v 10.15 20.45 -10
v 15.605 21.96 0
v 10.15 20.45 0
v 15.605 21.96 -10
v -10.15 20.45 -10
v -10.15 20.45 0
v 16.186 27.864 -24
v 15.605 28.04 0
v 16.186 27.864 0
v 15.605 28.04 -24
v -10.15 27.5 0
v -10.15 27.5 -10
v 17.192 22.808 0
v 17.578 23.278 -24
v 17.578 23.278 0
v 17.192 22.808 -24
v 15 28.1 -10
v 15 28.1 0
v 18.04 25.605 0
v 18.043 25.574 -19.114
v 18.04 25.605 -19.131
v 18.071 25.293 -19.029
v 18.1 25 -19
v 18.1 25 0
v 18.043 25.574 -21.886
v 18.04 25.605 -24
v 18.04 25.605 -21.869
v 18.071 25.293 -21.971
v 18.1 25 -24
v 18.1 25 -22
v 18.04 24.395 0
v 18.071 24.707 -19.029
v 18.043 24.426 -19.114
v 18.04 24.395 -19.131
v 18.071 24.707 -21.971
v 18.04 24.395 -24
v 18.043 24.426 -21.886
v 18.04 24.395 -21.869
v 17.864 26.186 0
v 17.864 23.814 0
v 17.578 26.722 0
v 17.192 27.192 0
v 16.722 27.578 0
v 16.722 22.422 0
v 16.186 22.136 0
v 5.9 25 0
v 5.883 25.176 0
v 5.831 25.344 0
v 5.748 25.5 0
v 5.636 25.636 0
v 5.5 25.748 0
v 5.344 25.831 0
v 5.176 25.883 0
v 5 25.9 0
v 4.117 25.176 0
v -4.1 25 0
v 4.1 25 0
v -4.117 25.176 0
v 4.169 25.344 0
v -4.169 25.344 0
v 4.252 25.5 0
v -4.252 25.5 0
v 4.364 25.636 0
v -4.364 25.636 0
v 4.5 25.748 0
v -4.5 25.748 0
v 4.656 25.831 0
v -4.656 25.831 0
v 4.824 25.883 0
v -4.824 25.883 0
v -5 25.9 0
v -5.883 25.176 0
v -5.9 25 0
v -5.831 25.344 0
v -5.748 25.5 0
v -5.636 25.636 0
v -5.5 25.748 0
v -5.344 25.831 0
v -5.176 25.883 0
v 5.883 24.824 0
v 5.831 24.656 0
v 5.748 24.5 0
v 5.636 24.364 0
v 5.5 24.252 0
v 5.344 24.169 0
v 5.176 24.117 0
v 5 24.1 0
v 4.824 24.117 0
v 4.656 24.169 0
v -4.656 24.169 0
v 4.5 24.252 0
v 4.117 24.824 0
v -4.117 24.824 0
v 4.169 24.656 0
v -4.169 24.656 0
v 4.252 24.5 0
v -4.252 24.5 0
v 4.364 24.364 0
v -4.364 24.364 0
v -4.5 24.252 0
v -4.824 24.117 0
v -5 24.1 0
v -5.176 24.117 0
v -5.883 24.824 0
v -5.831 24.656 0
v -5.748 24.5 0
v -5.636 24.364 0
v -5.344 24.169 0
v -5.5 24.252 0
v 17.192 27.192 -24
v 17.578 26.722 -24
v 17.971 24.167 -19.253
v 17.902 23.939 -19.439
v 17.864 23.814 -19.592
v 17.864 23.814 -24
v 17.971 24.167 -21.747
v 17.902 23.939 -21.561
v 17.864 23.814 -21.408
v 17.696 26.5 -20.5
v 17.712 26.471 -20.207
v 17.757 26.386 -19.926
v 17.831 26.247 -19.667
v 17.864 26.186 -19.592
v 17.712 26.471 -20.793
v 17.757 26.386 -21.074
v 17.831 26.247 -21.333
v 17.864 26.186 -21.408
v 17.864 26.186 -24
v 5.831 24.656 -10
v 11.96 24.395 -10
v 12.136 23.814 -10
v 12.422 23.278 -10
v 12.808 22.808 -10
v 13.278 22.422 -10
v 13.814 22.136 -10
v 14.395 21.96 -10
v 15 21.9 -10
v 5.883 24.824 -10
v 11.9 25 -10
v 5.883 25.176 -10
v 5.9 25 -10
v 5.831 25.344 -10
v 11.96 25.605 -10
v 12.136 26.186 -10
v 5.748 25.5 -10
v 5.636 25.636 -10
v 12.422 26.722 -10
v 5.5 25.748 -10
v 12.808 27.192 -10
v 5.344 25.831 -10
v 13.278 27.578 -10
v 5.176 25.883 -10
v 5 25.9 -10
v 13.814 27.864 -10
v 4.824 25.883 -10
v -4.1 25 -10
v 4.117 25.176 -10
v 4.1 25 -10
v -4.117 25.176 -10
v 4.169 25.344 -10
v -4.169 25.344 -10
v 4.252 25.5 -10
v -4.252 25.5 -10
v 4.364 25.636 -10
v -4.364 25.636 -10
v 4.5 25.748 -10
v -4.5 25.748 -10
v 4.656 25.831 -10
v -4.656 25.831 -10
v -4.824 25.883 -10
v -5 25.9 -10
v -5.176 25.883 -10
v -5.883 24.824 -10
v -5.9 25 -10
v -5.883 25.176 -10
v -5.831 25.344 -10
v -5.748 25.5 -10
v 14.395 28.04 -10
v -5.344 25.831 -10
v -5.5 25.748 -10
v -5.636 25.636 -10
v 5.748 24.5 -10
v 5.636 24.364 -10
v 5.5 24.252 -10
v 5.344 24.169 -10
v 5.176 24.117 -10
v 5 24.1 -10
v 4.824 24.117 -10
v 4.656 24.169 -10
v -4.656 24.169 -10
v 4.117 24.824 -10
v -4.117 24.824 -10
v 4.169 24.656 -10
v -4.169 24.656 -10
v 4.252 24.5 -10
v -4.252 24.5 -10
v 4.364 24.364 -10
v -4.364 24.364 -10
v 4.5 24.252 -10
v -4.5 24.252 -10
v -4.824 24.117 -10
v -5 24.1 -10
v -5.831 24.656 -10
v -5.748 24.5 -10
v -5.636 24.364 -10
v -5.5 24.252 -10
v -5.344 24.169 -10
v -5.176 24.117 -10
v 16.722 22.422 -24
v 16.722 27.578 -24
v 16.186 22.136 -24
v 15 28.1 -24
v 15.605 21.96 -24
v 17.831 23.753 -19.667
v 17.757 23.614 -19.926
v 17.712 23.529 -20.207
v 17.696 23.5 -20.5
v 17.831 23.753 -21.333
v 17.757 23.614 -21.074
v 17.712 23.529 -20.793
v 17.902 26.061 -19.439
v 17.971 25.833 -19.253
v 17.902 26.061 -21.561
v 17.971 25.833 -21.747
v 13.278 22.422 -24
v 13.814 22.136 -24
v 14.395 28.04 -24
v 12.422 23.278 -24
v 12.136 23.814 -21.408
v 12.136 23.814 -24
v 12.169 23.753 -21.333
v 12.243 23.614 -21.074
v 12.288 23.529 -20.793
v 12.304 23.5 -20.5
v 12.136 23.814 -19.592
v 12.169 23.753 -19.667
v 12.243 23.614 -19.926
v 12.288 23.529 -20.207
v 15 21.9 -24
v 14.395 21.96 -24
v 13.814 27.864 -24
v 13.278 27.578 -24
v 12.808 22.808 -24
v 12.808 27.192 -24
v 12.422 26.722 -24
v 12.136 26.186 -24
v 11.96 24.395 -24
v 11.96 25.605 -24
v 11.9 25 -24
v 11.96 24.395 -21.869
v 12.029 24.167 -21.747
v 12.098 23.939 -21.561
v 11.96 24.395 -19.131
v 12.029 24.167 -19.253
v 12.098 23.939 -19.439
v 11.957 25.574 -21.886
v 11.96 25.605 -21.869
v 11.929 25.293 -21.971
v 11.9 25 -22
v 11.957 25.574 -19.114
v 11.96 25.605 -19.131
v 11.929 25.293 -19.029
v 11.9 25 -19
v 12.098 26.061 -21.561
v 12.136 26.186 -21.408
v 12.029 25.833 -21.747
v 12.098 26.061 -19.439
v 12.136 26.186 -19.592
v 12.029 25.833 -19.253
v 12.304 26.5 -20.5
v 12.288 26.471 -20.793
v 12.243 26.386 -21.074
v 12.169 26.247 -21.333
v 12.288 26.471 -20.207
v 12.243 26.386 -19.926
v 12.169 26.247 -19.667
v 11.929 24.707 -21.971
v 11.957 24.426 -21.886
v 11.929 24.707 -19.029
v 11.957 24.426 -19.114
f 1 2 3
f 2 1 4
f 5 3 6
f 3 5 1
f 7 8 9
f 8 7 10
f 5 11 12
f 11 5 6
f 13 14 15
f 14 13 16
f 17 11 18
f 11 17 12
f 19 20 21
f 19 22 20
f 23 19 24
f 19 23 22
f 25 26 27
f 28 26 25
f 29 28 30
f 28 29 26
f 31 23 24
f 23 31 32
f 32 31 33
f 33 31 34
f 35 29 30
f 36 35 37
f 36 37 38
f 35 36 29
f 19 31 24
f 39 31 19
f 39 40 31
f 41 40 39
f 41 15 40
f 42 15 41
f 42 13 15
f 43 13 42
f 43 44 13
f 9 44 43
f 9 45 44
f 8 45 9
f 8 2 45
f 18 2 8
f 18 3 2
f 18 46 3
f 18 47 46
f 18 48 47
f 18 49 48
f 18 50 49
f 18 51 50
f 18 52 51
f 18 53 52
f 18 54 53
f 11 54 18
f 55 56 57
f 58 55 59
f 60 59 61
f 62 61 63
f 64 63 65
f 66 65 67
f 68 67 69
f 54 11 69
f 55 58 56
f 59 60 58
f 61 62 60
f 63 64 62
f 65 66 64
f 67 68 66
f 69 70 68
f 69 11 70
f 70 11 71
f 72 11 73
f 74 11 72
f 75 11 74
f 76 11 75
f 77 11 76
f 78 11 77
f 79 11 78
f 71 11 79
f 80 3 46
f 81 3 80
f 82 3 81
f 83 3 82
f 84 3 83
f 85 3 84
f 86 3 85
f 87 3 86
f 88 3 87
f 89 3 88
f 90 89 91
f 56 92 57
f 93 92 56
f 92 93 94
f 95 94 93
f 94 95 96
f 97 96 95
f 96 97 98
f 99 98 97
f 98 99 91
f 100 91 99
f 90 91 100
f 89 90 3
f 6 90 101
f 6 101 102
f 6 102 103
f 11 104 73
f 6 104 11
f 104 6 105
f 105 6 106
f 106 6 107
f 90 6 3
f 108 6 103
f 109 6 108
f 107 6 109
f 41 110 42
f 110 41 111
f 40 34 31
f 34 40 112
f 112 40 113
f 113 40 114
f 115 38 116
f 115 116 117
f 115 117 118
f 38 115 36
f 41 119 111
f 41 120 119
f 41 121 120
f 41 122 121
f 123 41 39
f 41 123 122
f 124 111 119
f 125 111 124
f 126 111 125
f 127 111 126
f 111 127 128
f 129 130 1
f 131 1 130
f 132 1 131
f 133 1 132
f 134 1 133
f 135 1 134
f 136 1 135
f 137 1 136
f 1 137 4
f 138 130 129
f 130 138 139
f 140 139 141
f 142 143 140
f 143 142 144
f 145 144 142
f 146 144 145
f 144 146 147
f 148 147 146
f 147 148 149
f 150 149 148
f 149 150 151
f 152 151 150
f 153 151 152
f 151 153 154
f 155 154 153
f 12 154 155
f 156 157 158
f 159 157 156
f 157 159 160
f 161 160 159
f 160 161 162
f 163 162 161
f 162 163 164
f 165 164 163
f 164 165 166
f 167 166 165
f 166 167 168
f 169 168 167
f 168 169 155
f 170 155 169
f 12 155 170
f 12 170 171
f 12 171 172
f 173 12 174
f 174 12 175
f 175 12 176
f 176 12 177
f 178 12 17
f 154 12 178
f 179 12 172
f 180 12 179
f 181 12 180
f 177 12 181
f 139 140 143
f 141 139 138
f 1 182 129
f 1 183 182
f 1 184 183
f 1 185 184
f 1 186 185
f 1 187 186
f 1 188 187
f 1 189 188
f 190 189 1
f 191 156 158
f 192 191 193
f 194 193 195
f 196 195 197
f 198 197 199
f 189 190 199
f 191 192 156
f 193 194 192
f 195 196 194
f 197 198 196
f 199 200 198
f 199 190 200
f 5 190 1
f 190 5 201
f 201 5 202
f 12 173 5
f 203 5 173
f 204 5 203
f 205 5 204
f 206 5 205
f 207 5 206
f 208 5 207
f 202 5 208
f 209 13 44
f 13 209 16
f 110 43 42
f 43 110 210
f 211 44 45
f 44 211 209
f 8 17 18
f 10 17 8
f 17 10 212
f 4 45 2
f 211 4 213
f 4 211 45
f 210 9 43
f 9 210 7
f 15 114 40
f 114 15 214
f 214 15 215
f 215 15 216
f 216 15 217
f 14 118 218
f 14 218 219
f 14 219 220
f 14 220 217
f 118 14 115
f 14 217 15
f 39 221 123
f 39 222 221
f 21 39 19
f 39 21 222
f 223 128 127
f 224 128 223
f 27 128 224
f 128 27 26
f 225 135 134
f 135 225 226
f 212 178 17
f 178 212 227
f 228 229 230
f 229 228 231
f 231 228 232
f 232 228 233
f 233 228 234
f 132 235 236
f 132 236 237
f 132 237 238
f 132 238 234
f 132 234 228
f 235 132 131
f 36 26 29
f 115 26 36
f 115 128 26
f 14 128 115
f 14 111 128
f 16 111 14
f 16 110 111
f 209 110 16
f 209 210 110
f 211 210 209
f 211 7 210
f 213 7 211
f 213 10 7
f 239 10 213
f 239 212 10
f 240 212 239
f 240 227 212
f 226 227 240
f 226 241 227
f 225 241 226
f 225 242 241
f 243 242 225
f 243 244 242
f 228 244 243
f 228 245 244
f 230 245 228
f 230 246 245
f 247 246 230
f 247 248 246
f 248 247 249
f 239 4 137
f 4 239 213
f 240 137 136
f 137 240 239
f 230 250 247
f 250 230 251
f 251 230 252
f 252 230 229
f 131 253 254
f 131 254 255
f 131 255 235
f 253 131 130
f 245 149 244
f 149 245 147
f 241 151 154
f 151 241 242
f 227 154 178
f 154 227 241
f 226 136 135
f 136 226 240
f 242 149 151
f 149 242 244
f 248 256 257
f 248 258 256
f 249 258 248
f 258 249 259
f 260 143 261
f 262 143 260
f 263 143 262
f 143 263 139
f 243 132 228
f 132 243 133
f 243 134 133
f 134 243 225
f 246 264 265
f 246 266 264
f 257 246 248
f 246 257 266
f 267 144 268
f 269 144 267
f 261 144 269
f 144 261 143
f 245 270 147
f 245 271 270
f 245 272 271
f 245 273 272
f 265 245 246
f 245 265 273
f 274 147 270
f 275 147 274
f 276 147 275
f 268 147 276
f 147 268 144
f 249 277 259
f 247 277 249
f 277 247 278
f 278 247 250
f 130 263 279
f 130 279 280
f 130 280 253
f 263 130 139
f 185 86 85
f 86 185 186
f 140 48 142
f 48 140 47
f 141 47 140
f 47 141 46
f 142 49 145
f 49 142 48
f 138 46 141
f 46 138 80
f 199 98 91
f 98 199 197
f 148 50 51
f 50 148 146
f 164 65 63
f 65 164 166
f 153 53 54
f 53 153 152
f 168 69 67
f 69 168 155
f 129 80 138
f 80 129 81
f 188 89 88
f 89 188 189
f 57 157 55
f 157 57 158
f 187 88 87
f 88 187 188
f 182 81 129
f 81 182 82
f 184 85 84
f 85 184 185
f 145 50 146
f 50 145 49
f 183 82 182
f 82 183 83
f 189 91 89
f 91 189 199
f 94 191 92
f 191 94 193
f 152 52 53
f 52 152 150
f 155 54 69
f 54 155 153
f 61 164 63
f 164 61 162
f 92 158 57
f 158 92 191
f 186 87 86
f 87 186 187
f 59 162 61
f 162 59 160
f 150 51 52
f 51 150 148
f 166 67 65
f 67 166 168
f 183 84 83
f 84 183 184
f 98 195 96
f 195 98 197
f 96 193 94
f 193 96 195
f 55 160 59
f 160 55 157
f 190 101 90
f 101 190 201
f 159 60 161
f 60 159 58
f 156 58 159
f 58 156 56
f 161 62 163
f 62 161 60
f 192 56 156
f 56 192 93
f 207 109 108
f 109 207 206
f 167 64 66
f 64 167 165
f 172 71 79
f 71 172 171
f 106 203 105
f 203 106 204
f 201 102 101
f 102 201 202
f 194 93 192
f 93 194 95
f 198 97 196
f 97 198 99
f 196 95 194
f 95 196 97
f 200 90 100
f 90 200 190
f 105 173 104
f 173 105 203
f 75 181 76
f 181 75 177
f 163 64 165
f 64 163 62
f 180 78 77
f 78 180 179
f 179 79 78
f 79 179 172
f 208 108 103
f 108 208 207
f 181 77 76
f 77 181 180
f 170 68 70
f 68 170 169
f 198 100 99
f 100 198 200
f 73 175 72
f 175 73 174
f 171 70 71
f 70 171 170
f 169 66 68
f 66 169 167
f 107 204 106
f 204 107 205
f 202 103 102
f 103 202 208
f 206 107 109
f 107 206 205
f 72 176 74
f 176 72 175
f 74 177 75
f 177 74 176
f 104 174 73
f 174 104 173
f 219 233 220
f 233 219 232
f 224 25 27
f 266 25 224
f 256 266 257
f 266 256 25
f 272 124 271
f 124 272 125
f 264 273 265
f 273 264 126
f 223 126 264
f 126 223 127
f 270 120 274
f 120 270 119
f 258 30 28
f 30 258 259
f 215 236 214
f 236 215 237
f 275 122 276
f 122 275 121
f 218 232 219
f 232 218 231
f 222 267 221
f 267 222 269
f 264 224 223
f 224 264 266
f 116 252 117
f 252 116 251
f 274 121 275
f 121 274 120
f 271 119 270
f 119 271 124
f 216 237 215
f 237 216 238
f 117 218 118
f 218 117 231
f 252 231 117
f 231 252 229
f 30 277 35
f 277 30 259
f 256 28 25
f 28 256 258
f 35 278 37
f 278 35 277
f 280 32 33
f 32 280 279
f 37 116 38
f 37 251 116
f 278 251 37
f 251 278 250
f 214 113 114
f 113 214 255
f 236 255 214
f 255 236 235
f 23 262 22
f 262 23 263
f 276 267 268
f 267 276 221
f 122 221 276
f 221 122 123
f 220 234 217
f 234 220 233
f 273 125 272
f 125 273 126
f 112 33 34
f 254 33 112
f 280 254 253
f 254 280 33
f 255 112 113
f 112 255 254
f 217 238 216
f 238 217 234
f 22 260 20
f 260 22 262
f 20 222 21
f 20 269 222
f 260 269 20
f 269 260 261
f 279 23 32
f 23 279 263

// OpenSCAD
// file: global_parameters.scad
//this is the distance that precisely sized surfaces must be brought in
//to account for 3d printing error in the XY plane
xy_fudge = 0.4;

//this is the distance that precisely sized surfaces must be brought in
//to account for 3d printing error in the Z direction
z_fudge = 0.1;


//to convert inches to mm
mm_in_1in = 25.4;


epsilon = 0.01;
// file: RaspberryPiCam.scad
/*
   _____                       
 / ___/__ ___ _  ___ _______ _
/ /__/ _ `/  ' \/ -_) __/ _ `/
\___/\_,_/_/_/_/\__/_/ _\_,_/ 
  / __/__  ___  / /__ / /     
 / _// _ \/ _ \/ (_-</_/      
/_/  \___/\___/_/___(_)  */

//Raspberry Pi Camera model

//For use with Pan Tilt Assembly file.

epsilon=.1;
width= 25;
height= 24;
depth=2;
camDispSide= 8.5;
camDispTop=12.5;
camDispBottom=5.5;
camSide=8;
holeD=2;
holeDisp=2;
holeDispHole=21;
holesDisp=9.5;

module cameraBack(){
cube([width,height,depth]);
}

//cameraBack();

module camera(){
translate([camDispSide,camDispBottom,depth])cube([camSide,camSide,depth]);
}
//camera();

module baseCam(){ union(){color("PaleGreen") cameraBack(); color("DarkBlue") camera();}

}

module hole(){
cylinder(h=depth+2*epsilon,r=holeD/2,center=false);
}

module holes(){
translate([holeDisp,holeDisp,-epsilon]) hole();

translate([holeDisp,camDispTop,-epsilon]) hole();

translate([holeDispHole+holeDisp,camDispTop,-epsilon]) hole();

translate([holeDispHole+holeDisp,holeDisp,-epsilon]) hole();
}

//holes();

module rasPiCam(){
difference(){baseCam(); translate([0,holesDisp,0])holes();}
}

//rasPiCam();
// file: servo1.scad
servo_width = 20.3;
servo_height = 38;
servo_length = 40.1;

servo_bracket_height=2.5;
servo_bracket_distance=10;
servo_bracket_length=55;

screw_r = 2.5;
screw_a = 50;
screw_b = 10;

horn_height=8;
horn_thickness=2;
horn_radius=15;
horn_inner_radius=6;
horn_hole_radius=0.8;
horn_hole_separation=4;
horn_hole_position=10;
horn_center_hole_radius = 4;

horn_offset = 9;

//servo();

module servo() {
	color("grey")
	servo_body();

	color("white")
	translate([0,servo_length/2-horn_offset,servo_bracket_distance])
		servo_horn();

}

module servo_body() {
color("DarkGrey")
translate([0,0,-servo_height+servo_bracket_distance]) {

	difference() {
	union() {
	translate([0,0,servo_height/2])
		cube(size=[servo_width,servo_length,servo_height],center=true);

	translate([0,0,servo_height+servo_bracket_height/2-servo_bracket_distance])
		cube(size=[servo_width,servo_bracket_length,servo_bracket_height],center=true);
	}

	for(a = [screw_a/2,-screw_a/2])
	for(b = [screw_b/2,-screw_b/2])
	translate([b,a,0])
	cylinder(h=servo_bracket_height*30,r=screw_r,$fn=16);
	}
}
}

module servo_horn() {

	color("White")
	difference() {
		union() {
			//wide cylinder
			translate([0,0,horn_height-horn_thickness])
				cylinder(r=horn_radius, h=horn_thickness,$fn=32);
			
			//tall cylinder
			cylinder(r=horn_inner_radius,h=horn_height);
		}

		//small holes
		for(j=[0,90,180,270])
		rotate(j)
		translate([0,horn_hole_position,0])
		for(i=[-horn_hole_separation,0,horn_hole_separation])
		translate([i,0,0])
			cylinder(r=horn_hole_radius,h=2*horn_height,$fn=8);

		//center hole
		cylinder(r=horn_center_hole_radius,h=horn_height*3,center=true,$fn=16);

	}

}
// main file
include<servo1.scad>
include<RaspberryPiCam.scad>
include<global_parameters.scad>

enclosure_width=29.8;
enclosure_front_z=10;

thickness=2;

servo_mount_height = 10;
servo_mount_hole_r = 0.9;

support_thickness = 1.0;

arm_a = 23;
arm_b = 47;
arm_width = horn_radius*2+2;
arm_thickness=4.5;

clear_blue=[0.5,0.5,1.0,0.75];

phi = 0;
theta = 180;

mount_post_r = 3.5;
mount_post_separation = 50;
mount_post_height = 24;
mount_post_x=15;
mount_pin_position=3.5;
mount_pin_r=1.5;

//pan_tilt_assembly();

right_bracket1();
//arm();

module right_bracket1() {
difference() {

union() {
hull() {
translate([-servo_width/2,servo_length/2+xy_fudge,-servo_bracket_distance])
cube(size=[servo_width,(servo_bracket_length-servo_length)/2-xy_fudge,servo_mount_height]);

translate([mount_post_x,mount_post_separation/2,-servo_mount_height])
cylinder(r=mount_post_r-xy_fudge,h=servo_mount_height,$fn=32);
}
translate([mount_post_x,mount_post_separation/2,-mount_post_height])
cylinder(r=mount_post_r-xy_fudge,h=mount_post_height,$fn=32);
}

for(b = [screw_b/2,-screw_b/2])
translate([b,screw_a/2,0])
cylinder(r=servo_mount_hole_r,h=2*servo_height,center=true,$fn=32);

translate([0,mount_post_separation/2,-mount_post_height+mount_pin_position])
rotate([0,90,0])
cylinder(h=200,r=mount_pin_r,center=true,$fn=32);
}
}


module left_bracket1() {
mirror([0,1,0])
right_bracket1();
}

module pan_tilt_assembly() {

	rotate(180)
	translate([0,-servo_length/2+horn_offset,-servo_bracket_distance-horn_height]) {
		servo_body();

		color(clear_blue) {
			right_bracket1();
			left_bracket1();
		}
	}

	rotate(theta) {
		translate([0,0,-horn_height])
			servo_horn();

		translate([0,-arm_a,arm_b])
		rotate([0,phi,0]){
		rotate([90,0,0]) 
		translate([0,-servo_length/2+horn_offset,-servo_bracket_distance-horn_height]) {
				servo_body();

				color(clear_blue)
					pantiltbracket1();

				translate([-servo_width/2-2*thickness,20,-5])
				rotate([0,90,180])
				camera_assembly();
		}

		rotate([90,0,0])
		translate([0,0,-horn_height])
		servo_horn();
		}

		color(clear_blue)
			arm();
	}
}


module arm() {
difference() {
union() {
difference() {
hull() {
cylinder(h=arm_thickness,r=arm_width/2,$fn=16);

translate([-arm_width/2,-arm_a-arm_thickness,0])
	cube(size=[arm_width,arm_thickness,arm_thickness]);
}
	//small holes
		for(j=[0,90,180,270])
		rotate(j)
		translate([0,horn_hole_position,0])
		for(i=[-horn_hole_separation,0,horn_hole_separation])
		translate([i,0,0])
			cylinder(r=horn_hole_radius,h=2*horn_height,$fn=8,center=true);

			//center hole
		cylinder(r=horn_center_hole_radius,h=horn_height*3,center=true,$fn=16);

}

translate([0,-arm_a,0])
rotate([90,0,0])
translate([0,arm_b,0])
difference() {
hull() {
cylinder(h=arm_thickness,r=arm_width/2,$fn=16);

translate([-arm_width/2,-arm_b-epsilon,0])
	cube(size=[arm_width,arm_thickness,arm_thickness]);
}
	//small holes
		for(j=[0,90,180,270])
		rotate(j)
		translate([0,horn_hole_position,0])
		for(i=[-horn_hole_separation,0,horn_hole_separation])
		translate([i,0,0])
			cylinder(r=horn_hole_radius,h=2*horn_height,$fn=8,center=true);

			//center hole
		cylinder(r=horn_center_hole_radius,h=horn_height*3,center=true,$fn=16);

}

translate([0,-arm_a,arm_thickness])
cube(size=[arm_width,arm_thickness*2,arm_thickness*2],center=true);
}
translate([0,-arm_a+arm_thickness,2*arm_thickness])
rotate([0,90,0])
cylinder(r=arm_thickness,h=arm_width*2,center=true);
}
}
	

module pantiltbracket1() {
difference() {
union() {
translate([-servo_width/2-thickness,-servo_length/2-xy_fudge-thickness,-enclosure_width+servo_bracket_distance])
cube(size=[thickness+servo_width,servo_length+2*xy_fudge+2*thickness,enclosure_width]);

translate([-thickness/2,0,-servo_mount_height/2-xy_fudge])
cube(size=[servo_width+thickness,servo_bracket_length,servo_mount_height],center=true);

}

translate([epsilon,0,0])
cube(size=[servo_width+epsilon,servo_length+2*xy_fudge,3*enclosure_width],center=true);

translate([0,0,servo_bracket_height/2])
cube(size=[servo_width+2*epsilon,2*servo_bracket_length,servo_bracket_height+2*xy_fudge],center=true);

for(a = [screw_a/2,-screw_a/2])
for(b = [screw_b/2,-screw_b/2])
translate([b,a,0])
cylinder(r=servo_mount_hole_r,h=2*servo_height,center=true,$fn=32);

}
}



module camera_assembly() {

color([0.5,0.5,0.5,0.5]) {
import("Raspberry_pi_camera_caseenclosure/enclosure_back_hack.stl");
import("Raspberry_pi_camera_caseenclosure/enclosure_front_hack.stl");
}

translate([-12.6,2.5,3])
rasPiCam();

}




//hacked a piece of troublesom plastic off of the part and exported as 
enclosure_back_z=-2;
enclosure_hack_w=1.8;
enclosure_hack_x=1.9;

//back_hack();
module back_hack() {
difference() {
translate([-enclosure_width/2,0,enclosure_back_z])
import("Raspberry_pi_camera_caseenclosure/raspberri_pi_camera_case_back_v0.4.STL");

translate([-enclosure_width/2,enclosure_hack_x,0])
cube(size=[enclosure_width,enclosure_hack_w,10]);
}
}

//front_hack();
module front_hack() {
translate([enclosure_width/2,0,enclosure_front_z])
rotate([0,180,0])
import("Raspberry_pi_camera_caseenclosure/raspberri_pi_camera_case_front_v0.4.2.STL");
}
